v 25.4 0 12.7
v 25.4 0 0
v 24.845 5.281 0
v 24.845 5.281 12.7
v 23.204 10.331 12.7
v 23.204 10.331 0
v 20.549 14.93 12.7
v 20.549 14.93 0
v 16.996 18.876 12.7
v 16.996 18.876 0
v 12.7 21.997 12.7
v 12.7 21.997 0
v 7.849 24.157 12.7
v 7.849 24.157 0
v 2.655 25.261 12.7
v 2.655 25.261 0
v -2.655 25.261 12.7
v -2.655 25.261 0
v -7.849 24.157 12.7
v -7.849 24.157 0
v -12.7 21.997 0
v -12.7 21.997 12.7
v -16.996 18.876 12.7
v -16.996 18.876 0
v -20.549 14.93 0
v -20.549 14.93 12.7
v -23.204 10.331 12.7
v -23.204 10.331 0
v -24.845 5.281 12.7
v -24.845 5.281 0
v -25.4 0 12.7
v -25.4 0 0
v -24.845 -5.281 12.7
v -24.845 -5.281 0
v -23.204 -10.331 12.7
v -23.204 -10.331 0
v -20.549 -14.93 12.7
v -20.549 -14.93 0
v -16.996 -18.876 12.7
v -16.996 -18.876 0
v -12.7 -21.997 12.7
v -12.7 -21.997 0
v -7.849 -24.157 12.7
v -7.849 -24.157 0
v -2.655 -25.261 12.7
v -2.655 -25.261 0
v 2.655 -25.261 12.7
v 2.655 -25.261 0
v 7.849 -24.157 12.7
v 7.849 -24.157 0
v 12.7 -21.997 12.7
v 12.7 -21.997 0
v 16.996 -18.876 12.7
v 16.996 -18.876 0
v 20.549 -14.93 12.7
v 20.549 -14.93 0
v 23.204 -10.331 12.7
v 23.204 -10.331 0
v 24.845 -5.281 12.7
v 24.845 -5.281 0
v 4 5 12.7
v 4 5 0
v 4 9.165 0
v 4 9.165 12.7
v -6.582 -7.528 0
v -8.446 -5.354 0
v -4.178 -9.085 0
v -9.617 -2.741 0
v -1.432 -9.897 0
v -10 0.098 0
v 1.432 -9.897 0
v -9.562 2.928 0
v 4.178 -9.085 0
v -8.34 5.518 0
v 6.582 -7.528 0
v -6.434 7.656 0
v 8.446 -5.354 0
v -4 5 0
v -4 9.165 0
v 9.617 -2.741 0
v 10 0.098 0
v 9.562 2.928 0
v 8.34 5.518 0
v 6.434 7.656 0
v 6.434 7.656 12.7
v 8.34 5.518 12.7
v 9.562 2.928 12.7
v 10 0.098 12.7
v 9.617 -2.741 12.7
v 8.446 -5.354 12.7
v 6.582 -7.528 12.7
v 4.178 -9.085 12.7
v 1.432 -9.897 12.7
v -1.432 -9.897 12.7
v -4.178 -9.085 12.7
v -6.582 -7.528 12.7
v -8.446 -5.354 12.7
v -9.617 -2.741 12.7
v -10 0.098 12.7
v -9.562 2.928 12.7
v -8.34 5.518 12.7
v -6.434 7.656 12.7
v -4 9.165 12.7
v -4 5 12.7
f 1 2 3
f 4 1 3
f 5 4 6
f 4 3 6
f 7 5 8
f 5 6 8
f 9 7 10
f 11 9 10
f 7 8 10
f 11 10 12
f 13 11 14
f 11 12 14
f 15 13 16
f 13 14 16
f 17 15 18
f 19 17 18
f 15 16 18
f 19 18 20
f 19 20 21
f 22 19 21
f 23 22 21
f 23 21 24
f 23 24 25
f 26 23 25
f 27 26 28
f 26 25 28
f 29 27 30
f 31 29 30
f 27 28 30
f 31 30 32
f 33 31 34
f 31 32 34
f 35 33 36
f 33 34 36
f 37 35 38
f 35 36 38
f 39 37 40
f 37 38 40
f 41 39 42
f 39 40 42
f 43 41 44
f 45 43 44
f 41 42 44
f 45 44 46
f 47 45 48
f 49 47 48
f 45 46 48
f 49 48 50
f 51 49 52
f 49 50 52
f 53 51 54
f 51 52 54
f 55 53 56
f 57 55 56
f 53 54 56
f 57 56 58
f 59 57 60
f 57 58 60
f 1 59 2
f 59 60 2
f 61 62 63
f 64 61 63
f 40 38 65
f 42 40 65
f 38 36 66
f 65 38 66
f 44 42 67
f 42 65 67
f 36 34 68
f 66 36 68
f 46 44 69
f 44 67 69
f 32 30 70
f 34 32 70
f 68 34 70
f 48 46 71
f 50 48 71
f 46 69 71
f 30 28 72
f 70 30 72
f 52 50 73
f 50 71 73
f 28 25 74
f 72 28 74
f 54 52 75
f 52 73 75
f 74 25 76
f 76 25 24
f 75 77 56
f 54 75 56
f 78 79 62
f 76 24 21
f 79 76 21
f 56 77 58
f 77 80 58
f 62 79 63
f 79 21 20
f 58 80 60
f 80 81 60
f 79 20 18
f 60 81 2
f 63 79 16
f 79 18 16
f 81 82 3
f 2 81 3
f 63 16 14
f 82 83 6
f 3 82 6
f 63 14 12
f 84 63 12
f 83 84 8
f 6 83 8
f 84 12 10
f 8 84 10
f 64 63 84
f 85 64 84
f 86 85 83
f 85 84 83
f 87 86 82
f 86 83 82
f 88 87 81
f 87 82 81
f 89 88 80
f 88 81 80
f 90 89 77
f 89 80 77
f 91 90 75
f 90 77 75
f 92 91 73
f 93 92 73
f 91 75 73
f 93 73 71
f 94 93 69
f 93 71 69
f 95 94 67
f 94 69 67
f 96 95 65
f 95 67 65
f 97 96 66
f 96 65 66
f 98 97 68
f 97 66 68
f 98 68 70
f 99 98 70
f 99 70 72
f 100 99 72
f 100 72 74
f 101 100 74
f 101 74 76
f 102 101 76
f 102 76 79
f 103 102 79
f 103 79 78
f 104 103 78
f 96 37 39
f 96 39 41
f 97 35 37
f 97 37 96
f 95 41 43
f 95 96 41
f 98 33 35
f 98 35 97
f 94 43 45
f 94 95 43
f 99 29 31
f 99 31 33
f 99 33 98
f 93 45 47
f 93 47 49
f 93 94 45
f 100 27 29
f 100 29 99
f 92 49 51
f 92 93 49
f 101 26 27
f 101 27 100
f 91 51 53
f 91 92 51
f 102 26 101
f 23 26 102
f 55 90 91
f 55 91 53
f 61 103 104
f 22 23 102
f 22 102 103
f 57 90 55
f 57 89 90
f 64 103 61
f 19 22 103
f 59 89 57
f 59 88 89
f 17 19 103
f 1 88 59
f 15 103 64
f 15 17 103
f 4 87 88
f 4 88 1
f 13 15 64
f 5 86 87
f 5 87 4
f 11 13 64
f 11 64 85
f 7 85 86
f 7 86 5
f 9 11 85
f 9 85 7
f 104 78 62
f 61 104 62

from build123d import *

# Parameters (mm, degrees)
SKETCH1_R           = 25.4
BOSS_EXTRUDE1_DEPTH = 12.7


with BuildPart() as part:
    # Sketch1 → Boss-Extrude1 (new body)
    with BuildSketch(Plane.XY):
        Circle(SKETCH1_R)
        with BuildLine():
            Line((-4, 9.16515139), (-4, 5))
            Line((-4, 5), (4, 5))
            Line((4, 5), (4, 9.16515139))
            ThreePointArc((4, 9.16515139), (0, -10), (-4, 9.16515139))
        make_face(mode=Mode.SUBTRACT)
    extrude(amount=BOSS_EXTRUDE1_DEPTH)


solid = part.part
